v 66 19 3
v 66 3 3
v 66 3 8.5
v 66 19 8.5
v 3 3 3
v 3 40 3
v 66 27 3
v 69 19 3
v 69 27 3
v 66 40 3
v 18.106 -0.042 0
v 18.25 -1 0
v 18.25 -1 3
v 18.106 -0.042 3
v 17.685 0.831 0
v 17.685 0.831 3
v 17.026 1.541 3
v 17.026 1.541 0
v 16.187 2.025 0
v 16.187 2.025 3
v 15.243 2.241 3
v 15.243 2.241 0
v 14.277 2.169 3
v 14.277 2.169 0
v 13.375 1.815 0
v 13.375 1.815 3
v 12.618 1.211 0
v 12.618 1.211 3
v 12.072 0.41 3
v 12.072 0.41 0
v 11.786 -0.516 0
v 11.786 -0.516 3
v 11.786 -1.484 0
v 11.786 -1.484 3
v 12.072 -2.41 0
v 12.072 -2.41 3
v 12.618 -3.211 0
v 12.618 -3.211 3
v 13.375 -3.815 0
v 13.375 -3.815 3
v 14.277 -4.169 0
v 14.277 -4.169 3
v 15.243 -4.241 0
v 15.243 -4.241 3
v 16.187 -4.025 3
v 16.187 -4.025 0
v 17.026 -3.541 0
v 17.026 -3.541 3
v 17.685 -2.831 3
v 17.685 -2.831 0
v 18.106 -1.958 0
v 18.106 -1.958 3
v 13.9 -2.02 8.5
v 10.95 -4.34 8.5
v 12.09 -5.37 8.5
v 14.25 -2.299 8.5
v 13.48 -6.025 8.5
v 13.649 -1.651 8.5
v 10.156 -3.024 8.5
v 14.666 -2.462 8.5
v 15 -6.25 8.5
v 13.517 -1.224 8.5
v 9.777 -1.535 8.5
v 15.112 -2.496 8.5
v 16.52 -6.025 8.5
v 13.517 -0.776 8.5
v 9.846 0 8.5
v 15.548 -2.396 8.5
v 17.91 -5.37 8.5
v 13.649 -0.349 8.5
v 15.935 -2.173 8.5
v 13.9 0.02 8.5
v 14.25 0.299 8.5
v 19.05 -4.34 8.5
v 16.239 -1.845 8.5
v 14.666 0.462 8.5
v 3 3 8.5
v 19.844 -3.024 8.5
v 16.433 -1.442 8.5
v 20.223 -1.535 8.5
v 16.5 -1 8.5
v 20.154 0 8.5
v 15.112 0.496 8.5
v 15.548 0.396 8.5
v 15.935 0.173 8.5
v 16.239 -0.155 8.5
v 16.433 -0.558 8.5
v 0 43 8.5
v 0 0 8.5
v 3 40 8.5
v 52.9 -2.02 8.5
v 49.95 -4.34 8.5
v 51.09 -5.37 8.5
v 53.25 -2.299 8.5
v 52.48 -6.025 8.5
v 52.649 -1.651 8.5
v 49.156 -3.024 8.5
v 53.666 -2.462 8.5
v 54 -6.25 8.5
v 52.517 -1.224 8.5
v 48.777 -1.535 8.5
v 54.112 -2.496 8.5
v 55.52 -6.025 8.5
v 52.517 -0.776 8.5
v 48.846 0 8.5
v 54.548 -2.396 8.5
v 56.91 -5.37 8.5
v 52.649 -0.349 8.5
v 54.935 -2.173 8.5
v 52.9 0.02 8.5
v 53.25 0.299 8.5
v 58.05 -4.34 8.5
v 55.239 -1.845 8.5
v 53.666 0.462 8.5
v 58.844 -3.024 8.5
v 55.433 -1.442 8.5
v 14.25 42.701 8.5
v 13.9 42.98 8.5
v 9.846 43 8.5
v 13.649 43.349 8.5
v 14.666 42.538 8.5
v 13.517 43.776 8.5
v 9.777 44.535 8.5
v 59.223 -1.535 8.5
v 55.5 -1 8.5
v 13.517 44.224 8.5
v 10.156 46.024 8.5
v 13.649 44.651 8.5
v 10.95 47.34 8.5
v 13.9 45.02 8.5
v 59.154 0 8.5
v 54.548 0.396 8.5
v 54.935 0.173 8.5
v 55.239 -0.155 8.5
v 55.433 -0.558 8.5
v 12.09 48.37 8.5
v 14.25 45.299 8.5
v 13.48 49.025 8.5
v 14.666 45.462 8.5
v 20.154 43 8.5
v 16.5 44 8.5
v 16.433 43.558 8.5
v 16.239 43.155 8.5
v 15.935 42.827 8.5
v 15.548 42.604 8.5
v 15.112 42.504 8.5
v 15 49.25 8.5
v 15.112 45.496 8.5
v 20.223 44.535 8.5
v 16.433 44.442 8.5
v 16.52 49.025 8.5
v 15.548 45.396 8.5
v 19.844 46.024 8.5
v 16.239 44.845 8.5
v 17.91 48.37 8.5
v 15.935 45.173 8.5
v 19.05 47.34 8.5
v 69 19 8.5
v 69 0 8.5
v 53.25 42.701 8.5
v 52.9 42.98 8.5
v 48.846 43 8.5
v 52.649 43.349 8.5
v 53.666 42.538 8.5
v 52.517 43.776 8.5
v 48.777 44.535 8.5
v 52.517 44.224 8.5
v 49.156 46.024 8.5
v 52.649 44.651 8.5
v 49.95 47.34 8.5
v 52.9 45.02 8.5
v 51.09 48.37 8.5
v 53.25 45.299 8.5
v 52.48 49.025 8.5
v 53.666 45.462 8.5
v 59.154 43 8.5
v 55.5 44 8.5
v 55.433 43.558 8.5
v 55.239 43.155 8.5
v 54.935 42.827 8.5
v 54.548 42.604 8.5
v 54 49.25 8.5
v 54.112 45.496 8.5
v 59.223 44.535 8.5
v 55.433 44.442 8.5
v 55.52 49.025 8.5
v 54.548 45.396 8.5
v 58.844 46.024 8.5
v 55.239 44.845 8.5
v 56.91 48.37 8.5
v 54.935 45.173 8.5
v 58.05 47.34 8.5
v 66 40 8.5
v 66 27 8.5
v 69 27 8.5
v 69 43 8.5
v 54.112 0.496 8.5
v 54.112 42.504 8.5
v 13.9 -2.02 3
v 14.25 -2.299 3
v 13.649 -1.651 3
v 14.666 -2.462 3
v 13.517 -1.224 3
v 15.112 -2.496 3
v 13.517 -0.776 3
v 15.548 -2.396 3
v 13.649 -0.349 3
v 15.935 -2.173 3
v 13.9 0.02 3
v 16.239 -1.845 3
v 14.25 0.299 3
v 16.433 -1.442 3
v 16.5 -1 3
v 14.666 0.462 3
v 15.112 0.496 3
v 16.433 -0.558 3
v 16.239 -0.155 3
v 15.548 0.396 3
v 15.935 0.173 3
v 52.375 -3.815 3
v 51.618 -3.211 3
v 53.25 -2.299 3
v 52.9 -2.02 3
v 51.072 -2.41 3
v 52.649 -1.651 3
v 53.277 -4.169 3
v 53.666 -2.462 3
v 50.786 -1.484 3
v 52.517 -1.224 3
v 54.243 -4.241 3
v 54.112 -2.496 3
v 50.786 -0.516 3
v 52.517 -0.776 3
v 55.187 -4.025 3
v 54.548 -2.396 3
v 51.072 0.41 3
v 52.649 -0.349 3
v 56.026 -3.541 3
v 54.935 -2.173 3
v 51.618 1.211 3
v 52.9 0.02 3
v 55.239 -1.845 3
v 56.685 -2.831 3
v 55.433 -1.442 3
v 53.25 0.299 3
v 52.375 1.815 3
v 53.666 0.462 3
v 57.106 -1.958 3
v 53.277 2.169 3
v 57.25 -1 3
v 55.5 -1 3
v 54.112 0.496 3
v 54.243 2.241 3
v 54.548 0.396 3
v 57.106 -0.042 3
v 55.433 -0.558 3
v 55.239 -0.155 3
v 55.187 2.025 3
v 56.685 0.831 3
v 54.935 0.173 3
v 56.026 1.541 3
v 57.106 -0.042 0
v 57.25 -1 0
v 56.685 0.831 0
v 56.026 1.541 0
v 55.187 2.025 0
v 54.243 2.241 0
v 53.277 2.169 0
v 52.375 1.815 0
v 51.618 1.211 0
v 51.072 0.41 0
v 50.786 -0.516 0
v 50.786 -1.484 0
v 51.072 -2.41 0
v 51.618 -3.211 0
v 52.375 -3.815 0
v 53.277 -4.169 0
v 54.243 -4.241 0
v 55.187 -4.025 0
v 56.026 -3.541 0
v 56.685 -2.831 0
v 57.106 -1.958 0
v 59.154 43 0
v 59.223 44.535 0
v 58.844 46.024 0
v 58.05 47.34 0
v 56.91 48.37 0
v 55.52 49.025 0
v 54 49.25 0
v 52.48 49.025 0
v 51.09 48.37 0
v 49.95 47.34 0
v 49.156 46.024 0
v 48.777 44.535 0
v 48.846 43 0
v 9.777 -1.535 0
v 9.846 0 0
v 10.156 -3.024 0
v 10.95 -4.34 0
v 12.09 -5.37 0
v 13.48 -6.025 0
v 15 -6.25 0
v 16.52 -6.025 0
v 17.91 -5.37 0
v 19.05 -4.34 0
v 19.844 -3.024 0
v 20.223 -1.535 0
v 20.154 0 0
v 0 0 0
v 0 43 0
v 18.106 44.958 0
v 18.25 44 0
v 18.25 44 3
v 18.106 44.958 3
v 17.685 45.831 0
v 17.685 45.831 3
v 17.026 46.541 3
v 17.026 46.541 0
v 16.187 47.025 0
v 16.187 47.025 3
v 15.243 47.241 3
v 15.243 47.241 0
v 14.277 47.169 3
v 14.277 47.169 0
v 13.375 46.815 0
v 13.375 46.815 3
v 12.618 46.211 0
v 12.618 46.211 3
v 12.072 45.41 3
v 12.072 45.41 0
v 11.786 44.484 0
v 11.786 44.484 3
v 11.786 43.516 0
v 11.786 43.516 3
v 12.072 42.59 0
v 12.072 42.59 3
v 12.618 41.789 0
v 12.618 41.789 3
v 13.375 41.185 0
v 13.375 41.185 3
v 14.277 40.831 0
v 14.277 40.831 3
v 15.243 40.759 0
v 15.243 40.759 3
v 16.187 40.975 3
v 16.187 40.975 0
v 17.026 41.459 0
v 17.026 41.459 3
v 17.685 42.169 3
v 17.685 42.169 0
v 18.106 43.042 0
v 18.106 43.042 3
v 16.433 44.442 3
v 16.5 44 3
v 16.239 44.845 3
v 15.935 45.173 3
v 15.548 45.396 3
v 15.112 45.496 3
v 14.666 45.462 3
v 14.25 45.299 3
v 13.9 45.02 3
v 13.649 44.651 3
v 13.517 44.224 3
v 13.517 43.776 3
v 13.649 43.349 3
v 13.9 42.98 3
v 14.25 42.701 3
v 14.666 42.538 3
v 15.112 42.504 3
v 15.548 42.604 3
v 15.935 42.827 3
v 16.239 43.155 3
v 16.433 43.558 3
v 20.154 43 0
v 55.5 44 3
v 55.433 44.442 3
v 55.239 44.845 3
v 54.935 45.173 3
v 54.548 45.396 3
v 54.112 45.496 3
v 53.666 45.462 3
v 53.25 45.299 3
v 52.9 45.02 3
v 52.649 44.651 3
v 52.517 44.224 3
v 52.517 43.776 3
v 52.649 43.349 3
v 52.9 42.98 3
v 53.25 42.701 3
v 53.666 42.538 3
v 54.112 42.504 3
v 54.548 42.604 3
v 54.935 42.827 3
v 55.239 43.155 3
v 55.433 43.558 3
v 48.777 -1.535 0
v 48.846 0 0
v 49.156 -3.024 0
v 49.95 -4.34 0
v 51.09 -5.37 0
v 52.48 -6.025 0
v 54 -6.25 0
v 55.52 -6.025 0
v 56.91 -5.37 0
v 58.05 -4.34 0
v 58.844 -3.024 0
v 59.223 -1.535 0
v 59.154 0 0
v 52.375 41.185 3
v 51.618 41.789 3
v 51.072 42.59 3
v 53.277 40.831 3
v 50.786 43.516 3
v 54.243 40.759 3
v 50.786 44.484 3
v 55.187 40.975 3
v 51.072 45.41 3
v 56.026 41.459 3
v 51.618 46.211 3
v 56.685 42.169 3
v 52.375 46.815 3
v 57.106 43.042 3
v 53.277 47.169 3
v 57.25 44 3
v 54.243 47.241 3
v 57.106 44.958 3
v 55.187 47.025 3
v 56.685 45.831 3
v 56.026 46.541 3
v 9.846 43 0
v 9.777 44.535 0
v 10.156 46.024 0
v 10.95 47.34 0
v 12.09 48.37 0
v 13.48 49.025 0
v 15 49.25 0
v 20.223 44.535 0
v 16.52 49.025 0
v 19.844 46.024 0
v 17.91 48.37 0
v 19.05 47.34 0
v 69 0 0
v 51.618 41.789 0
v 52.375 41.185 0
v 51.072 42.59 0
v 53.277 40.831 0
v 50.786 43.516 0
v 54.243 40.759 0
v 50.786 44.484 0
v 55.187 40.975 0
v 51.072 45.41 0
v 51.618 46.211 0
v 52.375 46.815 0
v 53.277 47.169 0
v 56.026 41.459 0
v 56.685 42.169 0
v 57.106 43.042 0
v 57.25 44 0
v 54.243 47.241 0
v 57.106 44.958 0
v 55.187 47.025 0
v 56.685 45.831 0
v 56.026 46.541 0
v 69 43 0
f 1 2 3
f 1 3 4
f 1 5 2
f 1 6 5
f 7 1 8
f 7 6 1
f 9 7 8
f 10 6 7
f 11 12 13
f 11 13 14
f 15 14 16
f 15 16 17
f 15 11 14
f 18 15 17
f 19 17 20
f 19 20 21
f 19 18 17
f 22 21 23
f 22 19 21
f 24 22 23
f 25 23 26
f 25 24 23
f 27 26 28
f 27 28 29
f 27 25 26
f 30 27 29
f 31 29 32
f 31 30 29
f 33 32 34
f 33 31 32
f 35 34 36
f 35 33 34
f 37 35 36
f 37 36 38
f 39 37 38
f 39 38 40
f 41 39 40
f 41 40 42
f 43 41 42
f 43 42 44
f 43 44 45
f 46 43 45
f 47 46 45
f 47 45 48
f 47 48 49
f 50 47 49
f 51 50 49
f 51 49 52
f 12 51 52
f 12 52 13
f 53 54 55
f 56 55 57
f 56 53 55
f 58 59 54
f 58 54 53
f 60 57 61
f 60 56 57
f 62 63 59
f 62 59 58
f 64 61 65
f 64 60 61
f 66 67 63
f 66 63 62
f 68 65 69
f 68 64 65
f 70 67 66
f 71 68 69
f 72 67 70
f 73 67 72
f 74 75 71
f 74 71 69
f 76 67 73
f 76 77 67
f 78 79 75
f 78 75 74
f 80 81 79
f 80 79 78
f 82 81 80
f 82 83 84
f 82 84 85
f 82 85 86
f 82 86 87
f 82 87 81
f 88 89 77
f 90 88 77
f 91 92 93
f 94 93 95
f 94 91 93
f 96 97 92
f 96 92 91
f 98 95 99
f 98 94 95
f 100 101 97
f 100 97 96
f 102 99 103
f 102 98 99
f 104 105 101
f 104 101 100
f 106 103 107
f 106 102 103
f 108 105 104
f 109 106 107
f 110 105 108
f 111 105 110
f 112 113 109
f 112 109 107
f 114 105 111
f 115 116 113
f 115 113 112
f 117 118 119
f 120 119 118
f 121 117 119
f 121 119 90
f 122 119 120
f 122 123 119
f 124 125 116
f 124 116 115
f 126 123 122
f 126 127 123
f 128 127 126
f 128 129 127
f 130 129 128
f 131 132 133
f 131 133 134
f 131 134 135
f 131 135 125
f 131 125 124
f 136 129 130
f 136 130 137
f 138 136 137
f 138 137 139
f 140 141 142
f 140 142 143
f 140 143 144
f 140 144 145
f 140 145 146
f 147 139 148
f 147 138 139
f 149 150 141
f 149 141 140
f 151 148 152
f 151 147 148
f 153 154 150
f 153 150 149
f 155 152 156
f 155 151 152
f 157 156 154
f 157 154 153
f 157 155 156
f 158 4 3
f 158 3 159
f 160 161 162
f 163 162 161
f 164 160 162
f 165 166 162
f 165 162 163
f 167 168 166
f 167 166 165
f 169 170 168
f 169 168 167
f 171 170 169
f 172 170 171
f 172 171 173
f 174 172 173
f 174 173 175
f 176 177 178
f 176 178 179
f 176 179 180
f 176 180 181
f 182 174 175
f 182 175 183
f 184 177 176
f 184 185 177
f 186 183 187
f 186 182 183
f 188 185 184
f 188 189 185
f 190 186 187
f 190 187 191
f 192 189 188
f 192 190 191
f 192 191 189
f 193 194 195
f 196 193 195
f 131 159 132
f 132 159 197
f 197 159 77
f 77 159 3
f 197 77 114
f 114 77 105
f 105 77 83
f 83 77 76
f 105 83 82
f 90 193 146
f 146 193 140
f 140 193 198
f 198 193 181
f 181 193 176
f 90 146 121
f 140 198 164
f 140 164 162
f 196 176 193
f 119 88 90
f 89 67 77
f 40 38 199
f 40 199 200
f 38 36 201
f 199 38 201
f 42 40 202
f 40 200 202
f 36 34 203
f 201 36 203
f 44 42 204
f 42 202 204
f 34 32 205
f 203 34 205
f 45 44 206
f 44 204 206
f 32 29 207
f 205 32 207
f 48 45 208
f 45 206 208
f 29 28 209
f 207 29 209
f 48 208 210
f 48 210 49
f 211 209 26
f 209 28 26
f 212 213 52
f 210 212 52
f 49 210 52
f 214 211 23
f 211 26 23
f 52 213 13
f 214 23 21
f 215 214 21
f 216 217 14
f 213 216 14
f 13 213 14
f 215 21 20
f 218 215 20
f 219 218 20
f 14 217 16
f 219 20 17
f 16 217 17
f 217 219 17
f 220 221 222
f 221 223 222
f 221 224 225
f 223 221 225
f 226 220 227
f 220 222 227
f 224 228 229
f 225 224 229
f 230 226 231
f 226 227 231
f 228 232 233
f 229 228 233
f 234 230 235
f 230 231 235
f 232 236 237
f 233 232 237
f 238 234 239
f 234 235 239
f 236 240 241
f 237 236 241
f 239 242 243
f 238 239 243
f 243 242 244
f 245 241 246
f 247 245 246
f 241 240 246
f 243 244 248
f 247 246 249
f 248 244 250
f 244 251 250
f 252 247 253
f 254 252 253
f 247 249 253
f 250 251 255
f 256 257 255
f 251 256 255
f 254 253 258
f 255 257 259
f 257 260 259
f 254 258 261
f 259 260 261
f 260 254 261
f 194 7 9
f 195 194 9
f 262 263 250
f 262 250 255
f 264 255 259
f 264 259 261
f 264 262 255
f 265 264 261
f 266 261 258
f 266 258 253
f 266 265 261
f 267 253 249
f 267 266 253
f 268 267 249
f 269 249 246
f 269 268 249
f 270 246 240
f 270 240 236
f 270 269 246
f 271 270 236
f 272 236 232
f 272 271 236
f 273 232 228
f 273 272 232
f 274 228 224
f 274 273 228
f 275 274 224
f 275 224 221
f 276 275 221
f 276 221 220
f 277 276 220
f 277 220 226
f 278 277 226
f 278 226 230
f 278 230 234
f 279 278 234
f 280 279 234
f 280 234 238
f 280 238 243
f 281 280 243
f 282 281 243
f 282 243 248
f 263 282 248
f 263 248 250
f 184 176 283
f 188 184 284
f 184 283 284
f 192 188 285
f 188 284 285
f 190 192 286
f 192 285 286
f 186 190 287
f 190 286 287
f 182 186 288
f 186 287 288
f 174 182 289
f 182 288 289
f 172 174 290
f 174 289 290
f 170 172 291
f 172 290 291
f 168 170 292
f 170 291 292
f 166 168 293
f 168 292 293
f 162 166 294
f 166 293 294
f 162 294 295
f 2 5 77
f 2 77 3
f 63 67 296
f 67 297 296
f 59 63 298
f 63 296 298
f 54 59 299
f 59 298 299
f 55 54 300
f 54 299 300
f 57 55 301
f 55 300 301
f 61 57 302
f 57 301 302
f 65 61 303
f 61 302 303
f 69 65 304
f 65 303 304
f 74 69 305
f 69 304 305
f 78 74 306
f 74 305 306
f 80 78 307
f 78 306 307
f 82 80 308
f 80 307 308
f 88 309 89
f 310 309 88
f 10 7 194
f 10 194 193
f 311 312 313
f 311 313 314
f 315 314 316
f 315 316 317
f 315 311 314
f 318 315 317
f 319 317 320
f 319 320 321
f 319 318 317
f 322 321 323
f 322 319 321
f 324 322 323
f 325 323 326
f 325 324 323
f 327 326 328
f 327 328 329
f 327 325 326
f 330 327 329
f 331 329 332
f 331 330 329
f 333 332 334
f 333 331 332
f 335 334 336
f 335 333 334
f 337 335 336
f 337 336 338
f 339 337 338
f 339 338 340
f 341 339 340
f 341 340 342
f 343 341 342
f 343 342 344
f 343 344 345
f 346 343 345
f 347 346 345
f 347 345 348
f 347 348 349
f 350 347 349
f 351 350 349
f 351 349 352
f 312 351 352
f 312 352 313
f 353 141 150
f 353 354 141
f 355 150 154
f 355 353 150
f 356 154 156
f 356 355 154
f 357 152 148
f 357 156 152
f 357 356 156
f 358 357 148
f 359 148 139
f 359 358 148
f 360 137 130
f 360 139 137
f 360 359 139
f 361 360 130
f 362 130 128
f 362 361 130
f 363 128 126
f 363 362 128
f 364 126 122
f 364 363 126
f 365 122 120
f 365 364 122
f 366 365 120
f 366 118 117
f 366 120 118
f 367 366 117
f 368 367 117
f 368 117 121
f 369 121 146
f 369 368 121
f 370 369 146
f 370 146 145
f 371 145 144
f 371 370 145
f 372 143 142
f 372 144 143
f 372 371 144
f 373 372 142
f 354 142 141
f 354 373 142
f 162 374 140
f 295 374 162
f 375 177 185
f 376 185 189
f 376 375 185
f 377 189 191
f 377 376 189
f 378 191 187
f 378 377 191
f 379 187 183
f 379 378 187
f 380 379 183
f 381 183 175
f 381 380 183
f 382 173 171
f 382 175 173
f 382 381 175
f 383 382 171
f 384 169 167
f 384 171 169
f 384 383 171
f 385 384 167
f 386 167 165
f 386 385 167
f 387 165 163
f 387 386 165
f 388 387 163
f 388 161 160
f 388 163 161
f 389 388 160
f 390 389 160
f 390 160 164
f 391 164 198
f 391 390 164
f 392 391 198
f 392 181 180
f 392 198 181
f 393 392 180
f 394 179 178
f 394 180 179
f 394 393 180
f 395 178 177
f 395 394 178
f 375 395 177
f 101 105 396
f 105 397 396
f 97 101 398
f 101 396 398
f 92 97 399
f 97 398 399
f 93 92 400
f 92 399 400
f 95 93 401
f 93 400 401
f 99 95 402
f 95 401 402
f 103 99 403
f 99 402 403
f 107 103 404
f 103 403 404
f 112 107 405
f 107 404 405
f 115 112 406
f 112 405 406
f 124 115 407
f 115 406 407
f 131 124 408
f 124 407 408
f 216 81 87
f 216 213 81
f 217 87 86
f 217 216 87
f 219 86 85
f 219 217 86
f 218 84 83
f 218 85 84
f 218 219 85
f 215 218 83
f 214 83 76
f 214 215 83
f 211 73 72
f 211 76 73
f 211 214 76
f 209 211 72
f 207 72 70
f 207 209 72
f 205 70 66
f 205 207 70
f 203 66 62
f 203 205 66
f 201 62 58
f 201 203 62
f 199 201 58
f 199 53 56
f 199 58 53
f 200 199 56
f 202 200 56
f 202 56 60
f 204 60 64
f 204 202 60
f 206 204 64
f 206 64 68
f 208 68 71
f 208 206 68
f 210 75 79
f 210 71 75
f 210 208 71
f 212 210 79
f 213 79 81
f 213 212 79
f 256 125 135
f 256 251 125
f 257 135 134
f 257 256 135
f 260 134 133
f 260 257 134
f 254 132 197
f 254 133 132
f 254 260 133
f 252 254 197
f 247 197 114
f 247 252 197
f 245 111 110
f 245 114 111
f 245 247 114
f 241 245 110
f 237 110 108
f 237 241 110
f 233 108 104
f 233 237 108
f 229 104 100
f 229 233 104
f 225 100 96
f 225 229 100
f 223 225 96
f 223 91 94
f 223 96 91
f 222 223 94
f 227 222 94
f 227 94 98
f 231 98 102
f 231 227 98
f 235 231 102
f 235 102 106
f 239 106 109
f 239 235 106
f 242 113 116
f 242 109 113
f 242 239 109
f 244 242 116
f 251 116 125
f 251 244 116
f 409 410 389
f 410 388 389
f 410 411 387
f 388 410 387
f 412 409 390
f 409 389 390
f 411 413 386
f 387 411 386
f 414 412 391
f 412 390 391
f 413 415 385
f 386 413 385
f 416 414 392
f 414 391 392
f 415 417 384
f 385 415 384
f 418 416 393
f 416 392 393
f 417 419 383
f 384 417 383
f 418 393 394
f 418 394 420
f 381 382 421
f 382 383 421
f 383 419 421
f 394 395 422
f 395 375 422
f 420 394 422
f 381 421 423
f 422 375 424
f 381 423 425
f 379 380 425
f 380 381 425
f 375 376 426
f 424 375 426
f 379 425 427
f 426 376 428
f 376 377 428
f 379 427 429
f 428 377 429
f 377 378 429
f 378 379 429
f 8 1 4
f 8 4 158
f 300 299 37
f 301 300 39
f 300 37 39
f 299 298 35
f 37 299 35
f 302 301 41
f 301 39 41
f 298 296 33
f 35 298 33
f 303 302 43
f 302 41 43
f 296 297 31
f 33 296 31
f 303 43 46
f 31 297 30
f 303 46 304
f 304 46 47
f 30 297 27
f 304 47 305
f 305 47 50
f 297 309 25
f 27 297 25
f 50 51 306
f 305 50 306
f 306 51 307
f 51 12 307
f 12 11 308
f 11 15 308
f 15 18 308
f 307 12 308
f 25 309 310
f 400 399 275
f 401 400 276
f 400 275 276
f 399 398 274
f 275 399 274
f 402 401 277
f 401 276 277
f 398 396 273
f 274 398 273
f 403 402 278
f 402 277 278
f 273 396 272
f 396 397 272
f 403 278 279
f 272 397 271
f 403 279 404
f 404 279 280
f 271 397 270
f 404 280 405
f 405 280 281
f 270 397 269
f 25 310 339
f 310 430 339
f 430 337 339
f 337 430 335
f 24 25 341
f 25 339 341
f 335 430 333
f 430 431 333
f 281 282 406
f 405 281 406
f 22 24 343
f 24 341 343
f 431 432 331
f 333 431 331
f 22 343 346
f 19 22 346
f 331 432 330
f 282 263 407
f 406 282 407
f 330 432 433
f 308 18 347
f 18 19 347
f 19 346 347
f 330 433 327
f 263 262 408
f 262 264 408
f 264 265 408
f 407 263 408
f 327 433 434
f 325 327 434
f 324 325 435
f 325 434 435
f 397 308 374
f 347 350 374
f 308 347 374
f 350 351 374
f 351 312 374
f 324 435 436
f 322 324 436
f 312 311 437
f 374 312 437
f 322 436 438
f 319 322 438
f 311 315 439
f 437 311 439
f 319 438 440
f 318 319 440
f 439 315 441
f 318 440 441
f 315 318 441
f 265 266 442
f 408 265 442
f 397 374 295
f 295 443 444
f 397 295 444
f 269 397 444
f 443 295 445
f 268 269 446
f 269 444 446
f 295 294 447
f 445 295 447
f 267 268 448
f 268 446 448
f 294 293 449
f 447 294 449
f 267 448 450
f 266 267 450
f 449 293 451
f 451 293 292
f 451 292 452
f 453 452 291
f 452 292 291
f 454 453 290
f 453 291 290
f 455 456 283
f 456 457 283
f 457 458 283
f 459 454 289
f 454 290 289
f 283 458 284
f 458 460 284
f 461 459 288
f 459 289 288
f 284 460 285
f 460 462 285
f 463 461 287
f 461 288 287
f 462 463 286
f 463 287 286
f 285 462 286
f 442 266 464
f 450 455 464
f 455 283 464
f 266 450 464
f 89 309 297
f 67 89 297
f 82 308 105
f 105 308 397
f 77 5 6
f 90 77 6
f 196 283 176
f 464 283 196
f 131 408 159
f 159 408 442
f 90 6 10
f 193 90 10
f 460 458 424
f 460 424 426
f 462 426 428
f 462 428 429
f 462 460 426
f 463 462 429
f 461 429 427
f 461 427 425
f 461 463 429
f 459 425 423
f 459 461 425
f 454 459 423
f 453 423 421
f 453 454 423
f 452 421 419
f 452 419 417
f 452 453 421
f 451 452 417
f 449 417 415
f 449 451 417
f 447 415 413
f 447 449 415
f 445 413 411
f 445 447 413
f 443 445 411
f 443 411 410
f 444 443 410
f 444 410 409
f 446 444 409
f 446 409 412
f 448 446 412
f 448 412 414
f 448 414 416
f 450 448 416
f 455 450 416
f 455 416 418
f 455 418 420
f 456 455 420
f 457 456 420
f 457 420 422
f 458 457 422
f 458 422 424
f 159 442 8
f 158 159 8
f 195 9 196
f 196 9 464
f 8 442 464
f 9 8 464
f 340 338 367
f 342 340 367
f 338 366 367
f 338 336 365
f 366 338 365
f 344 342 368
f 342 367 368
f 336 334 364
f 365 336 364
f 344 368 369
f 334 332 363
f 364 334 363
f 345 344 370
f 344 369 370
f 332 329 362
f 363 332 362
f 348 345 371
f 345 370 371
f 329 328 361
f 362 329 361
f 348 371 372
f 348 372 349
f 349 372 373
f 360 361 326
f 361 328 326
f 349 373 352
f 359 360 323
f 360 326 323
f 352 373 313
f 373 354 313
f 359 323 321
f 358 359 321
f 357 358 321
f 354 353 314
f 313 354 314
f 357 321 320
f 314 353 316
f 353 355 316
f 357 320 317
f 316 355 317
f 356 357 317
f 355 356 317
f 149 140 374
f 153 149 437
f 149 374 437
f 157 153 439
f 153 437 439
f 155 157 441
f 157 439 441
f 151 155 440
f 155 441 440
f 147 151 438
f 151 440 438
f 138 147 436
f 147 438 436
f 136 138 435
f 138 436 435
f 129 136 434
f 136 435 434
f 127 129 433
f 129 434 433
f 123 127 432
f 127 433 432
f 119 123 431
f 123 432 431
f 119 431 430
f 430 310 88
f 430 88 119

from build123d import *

# Parameters (mm, degrees)
BOX007_W          = 63
BOX007_H          = 37
BOX007_DEPTH      = 5.5
BOX006_W          = 10
BOX006_H          = 8
BOX006_DEPTH      = 5.5
CYLINDER016_R     = 3.25
CYLINDER016_DEPTH = 3
CYLINDER017_R     = 1.5
CYLINDER017_DEPTH = 8.5
CYLINDER018_R     = 5.25
CYLINDER018_DEPTH = 8.5
CYLINDER014_R     = 3.25
CYLINDER014_DEPTH = 3
CYLINDER013_R     = 1.5
CYLINDER013_DEPTH = 8.5
CYLINDER015_R     = 5.25
CYLINDER015_DEPTH = 8.5
CYLINDER010_R     = 3.25
CYLINDER010_DEPTH = 3
CYLINDER009_R     = 1.5
CYLINDER009_DEPTH = 8.5
CYLINDER008_R     = 5.25
CYLINDER008_DEPTH = 8.5
CYLINDER021_R     = 3.25
CYLINDER021_DEPTH = 3
CYLINDER020_R     = 1.5
CYLINDER020_DEPTH = 8.5
CYLINDER019_R     = 5.25
CYLINDER019_DEPTH = 8.5
CYLINDER023_R     = 3.25
CYLINDER023_DEPTH = 3
CYLINDER022_R     = 1.5
CYLINDER022_DEPTH = 8.5
CYLINDER025_R     = 3.25
CYLINDER025_DEPTH = 3
CYLINDER024_R     = 1.5
CYLINDER024_DEPTH = 8.5
CYLINDER026_R     = 3.25
CYLINDER026_DEPTH = 3
CYLINDER027_R     = 1.5
CYLINDER027_DEPTH = 8.5
CYLINDER029_R     = 3.25
CYLINDER029_DEPTH = 3
CYLINDER028_R     = 1.5
CYLINDER028_DEPTH = 8.5
BOX_W             = 63
BOX_H             = 37
BOX_DEPTH         = 6
BOX001_W          = 10
BOX001_H          = 8
BOX001_DEPTH      = 6
BOX002_W          = 69
BOX002_H          = 43
BOX002_DEPTH      = 8.5


with BuildPart() as cube006:
    # Box007 → Box007 (new body)
    with BuildSketch(Plane.XY):
        with Locations((31.5, 18.5)):
            Rectangle(BOX007_W, BOX007_H)
    extrude(amount=BOX007_DEPTH)


with BuildPart() as battery_model002:
    # Box006 → Box006 (new body)
    with BuildSketch(Plane(origin=(63, 16, 0), x_dir=(1, 0, 0), z_dir=(0, 0, 1))):
        with Locations((5, 4)):
            Rectangle(BOX006_W, BOX006_H)
    extrude(amount=BOX006_DEPTH)

    # Fusion012: union Cube006
    add(cube006.part)


with BuildPart() as battery_model002_1:
    # Fusion012 placement: moved
    add(battery_model002.part.moved(Location((3, 3, 3))))


with BuildPart() as nut_recess002:
    # Cylinder016 → Cylinder016 (new body)
    with BuildSketch(Plane(origin=(15, -1, 0), x_dir=(1, 0, 0), z_dir=(0, 0, 1))):
        Circle(CYLINDER016_R)
    extrude(amount=CYLINDER016_DEPTH)


with BuildPart() as base_bolt_assembly002:
    # Cylinder017 → Cylinder017 (new body)
    with BuildSketch(Plane(origin=(15, -1, 0), x_dir=(1, 0, 0), z_dir=(0, 0, 1))):
        Circle(CYLINDER017_R)
    extrude(amount=CYLINDER017_DEPTH)

    # Fusion004: union Nut Recess002
    add(nut_recess002.part)


with BuildPart() as base_bolt_flange_ur:
    # Cylinder018 → Cylinder018 (new body)
    with BuildSketch(Plane(origin=(15, -1, 0), x_dir=(1, 0, 0), z_dir=(0, 0, 1))):
        Circle(CYLINDER018_R)
    extrude(amount=CYLINDER018_DEPTH)

    # Cut005: cut Base Bolt Assembly002
    add(base_bolt_assembly002.part, mode=Mode.SUBTRACT)


with BuildPart() as base_bolt_flange_ur_1:
    # Cut005 placement: moved
    add(base_bolt_flange_ur.part.moved(Location((39, 45, 0))))


with BuildPart() as nut_recess001:
    # Cylinder014 → Cylinder014 (new body)
    with BuildSketch(Plane(origin=(15, -1, 0), x_dir=(1, 0, 0), z_dir=(0, 0, 1))):
        Circle(CYLINDER014_R)
    extrude(amount=CYLINDER014_DEPTH)


with BuildPart() as base_bolt_assembly001:
    # Cylinder013 → Cylinder013 (new body)
    with BuildSketch(Plane(origin=(15, -1, 0), x_dir=(1, 0, 0), z_dir=(0, 0, 1))):
        Circle(CYLINDER013_R)
    extrude(amount=CYLINDER013_DEPTH)

    # Fusion003: union Nut Recess001
    add(nut_recess001.part)


with BuildPart() as base_bolt_flange_lr:
    # Cylinder015 → Cylinder015 (new body)
    with BuildSketch(Plane(origin=(15, -1, 0), x_dir=(1, 0, 0), z_dir=(0, 0, 1))):
        Circle(CYLINDER015_R)
    extrude(amount=CYLINDER015_DEPTH)

    # Cut004: cut Base Bolt Assembly001
    add(base_bolt_assembly001.part, mode=Mode.SUBTRACT)


with BuildPart() as base_bolt_flange_lr_1:
    # Cut004 placement: moved
    add(base_bolt_flange_lr.part.moved(Location((39, 0, 0))))


with BuildPart() as nut_recess:
    # Cylinder010 → Cylinder010 (new body)
    with BuildSketch(Plane(origin=(15, -1, 0), x_dir=(1, 0, 0), z_dir=(0, 0, 1))):
        Circle(CYLINDER010_R)
    extrude(amount=CYLINDER010_DEPTH)


with BuildPart() as base_bolt_assembly:
    # Cylinder009 → Cylinder009 (new body)
    with BuildSketch(Plane(origin=(15, -1, 0), x_dir=(1, 0, 0), z_dir=(0, 0, 1))):
        Circle(CYLINDER009_R)
    extrude(amount=CYLINDER009_DEPTH)

    # Fusion002: union Nut Recess
    add(nut_recess.part)


with BuildPart() as base_bolt_flange_ll:
    # Cylinder008 → Cylinder008 (new body)
    with BuildSketch(Plane(origin=(15, -1, 0), x_dir=(1, 0, 0), z_dir=(0, 0, 1))):
        Circle(CYLINDER008_R)
    extrude(amount=CYLINDER008_DEPTH)

    # Cut002: cut Base Bolt Assembly
    add(base_bolt_assembly.part, mode=Mode.SUBTRACT)


with BuildPart() as nut_recess003:
    # Cylinder021 → Cylinder021 (new body)
    with BuildSketch(Plane(origin=(15, -1, 0), x_dir=(1, 0, 0), z_dir=(0, 0, 1))):
        Circle(CYLINDER021_R)
    extrude(amount=CYLINDER021_DEPTH)


with BuildPart() as base_bolt_assembly003:
    # Cylinder020 → Cylinder020 (new body)
    with BuildSketch(Plane(origin=(15, -1, 0), x_dir=(1, 0, 0), z_dir=(0, 0, 1))):
        Circle(CYLINDER020_R)
    extrude(amount=CYLINDER020_DEPTH)

    # Fusion005: union Nut Recess003
    add(nut_recess003.part)


with BuildPart() as base_bolt_assemblies_no_bat:
    # Cylinder019 → Cylinder019 (new body)
    with BuildSketch(Plane(origin=(15, -1, 0), x_dir=(1, 0, 0), z_dir=(0, 0, 1))):
        Circle(CYLINDER019_R)
    extrude(amount=CYLINDER019_DEPTH)

    # Cut006: cut Base Bolt Assembly003
    add(base_bolt_assembly003.part, mode=Mode.SUBTRACT)


with BuildPart() as base_bolt_assemblies_no_bat_1:
    # Cut006 placement: moved
    add(base_bolt_assemblies_no_bat.part.moved(Location((0, 45, 0))))

    # Fusion011: union Base Bolt Flange - UR, Base Bolt Flange - LR, Base Bolt Flange - LL
    add(base_bolt_flange_ur_1.part)
    add(base_bolt_flange_lr_1.part)
    add(base_bolt_flange_ll.part)

    # Cut008: cut Battery Model002
    add(battery_model002_1.part, mode=Mode.SUBTRACT)


with BuildPart() as nut_recess004:
    # Cylinder023 → Cylinder023 (new body)
    with BuildSketch(Plane(origin=(15, -1, 0), x_dir=(1, 0, 0), z_dir=(0, 0, 1))):
        Circle(CYLINDER023_R)
    extrude(amount=CYLINDER023_DEPTH)


with BuildPart() as base_bolt_assembly_ll:
    # Cylinder022 → Cylinder022 (new body)
    with BuildSketch(Plane(origin=(15, -1, 0), x_dir=(1, 0, 0), z_dir=(0, 0, 1))):
        Circle(CYLINDER022_R)
    extrude(amount=CYLINDER022_DEPTH)

    # Fusion006: union Nut Recess004
    add(nut_recess004.part)


with BuildPart() as nut_recess005:
    # Cylinder025 → Cylinder025 (new body)
    with BuildSketch(Plane(origin=(15, -1, 0), x_dir=(1, 0, 0), z_dir=(0, 0, 1))):
        Circle(CYLINDER025_R)
    extrude(amount=CYLINDER025_DEPTH)


with BuildPart() as base_bolt_assembly_lr:
    # Cylinder024 → Cylinder024 (new body)
    with BuildSketch(Plane(origin=(15, -1, 0), x_dir=(1, 0, 0), z_dir=(0, 0, 1))):
        Circle(CYLINDER024_R)
    extrude(amount=CYLINDER024_DEPTH)

    # Fusion007: union Nut Recess005
    add(nut_recess005.part)


with BuildPart() as base_bolt_assembly_lr_1:
    # Fusion007 placement: moved
    add(base_bolt_assembly_lr.part.moved(Location((39, 0, 0))))


with BuildPart() as nut_recess006:
    # Cylinder026 → Cylinder026 (new body)
    with BuildSketch(Plane(origin=(15, -1, 0), x_dir=(1, 0, 0), z_dir=(0, 0, 1))):
        Circle(CYLINDER026_R)
    extrude(amount=CYLINDER026_DEPTH)


with BuildPart() as base_bolt_assembly_ur:
    # Cylinder027 → Cylinder027 (new body)
    with BuildSketch(Plane(origin=(15, -1, 0), x_dir=(1, 0, 0), z_dir=(0, 0, 1))):
        Circle(CYLINDER027_R)
    extrude(amount=CYLINDER027_DEPTH)

    # Fusion008: union Nut Recess006
    add(nut_recess006.part)


with BuildPart() as base_bolt_assembly_ur_1:
    # Fusion008 placement: moved
    add(base_bolt_assembly_ur.part.moved(Location((39, 45, 0))))


with BuildPart() as nut_recess007:
    # Cylinder029 → Cylinder029 (new body)
    with BuildSketch(Plane(origin=(15, -1, 0), x_dir=(1, 0, 0), z_dir=(0, 0, 1))):
        Circle(CYLINDER029_R)
    extrude(amount=CYLINDER029_DEPTH)


with BuildPart() as base_bolt_remove_assembly:
    # Cylinder028 → Cylinder028 (new body)
    with BuildSketch(Plane(origin=(15, -1, 0), x_dir=(1, 0, 0), z_dir=(0, 0, 1))):
        Circle(CYLINDER028_R)
    extrude(amount=CYLINDER028_DEPTH)

    # Fusion009: union Nut Recess007
    add(nut_recess007.part)


with BuildPart() as base_bolt_remove_assembly_1:
    # Fusion009 placement: moved
    add(base_bolt_remove_assembly.part.moved(Location((0, 45, 0))))

    # Fusion010: union Base Bolt Assembly - LL, Base Bolt Assembly - LR, Base Bolt Assembly - UR
    add(base_bolt_assembly_ll.part)
    add(base_bolt_assembly_lr_1.part)
    add(base_bolt_assembly_ur_1.part)


with BuildPart() as cube:
    # Box → Box (new body)
    with BuildSketch(Plane.XY):
        with Locations((31.5, 18.5)):
            Rectangle(BOX_W, BOX_H)
    extrude(amount=BOX_DEPTH)


with BuildPart() as battery_model:
    # Box001 → Box001 (new body)
    with BuildSketch(Plane(origin=(63, 16, 0), x_dir=(1, 0, 0), z_dir=(0, 0, 1))):
        with Locations((5, 4)):
            Rectangle(BOX001_W, BOX001_H)
    extrude(amount=BOX001_DEPTH)

    # Fusion: union Cube
    add(cube.part)


with BuildPart() as battery_model_1:
    # Fusion placement: moved
    add(battery_model.part.moved(Location((3, 3, 3))))


with BuildPart() as base_initial:
    # Box002 → Box002 (new body)
    with BuildSketch(Plane.XY):
        with Locations((34.5, 21.5)):
            Rectangle(BOX002_W, BOX002_H)
    extrude(amount=BOX002_DEPTH)

    # Cut: cut Battery Model
    add(battery_model_1.part, mode=Mode.SUBTRACT)

    # Cut007: cut Base Bolt Remove Assembly
    add(base_bolt_remove_assembly_1.part, mode=Mode.SUBTRACT)

    # Fusion013: union Base Bolt Assemblies - no Bat
    add(base_bolt_assemblies_no_bat_1.part)


solid = base_initial.part
